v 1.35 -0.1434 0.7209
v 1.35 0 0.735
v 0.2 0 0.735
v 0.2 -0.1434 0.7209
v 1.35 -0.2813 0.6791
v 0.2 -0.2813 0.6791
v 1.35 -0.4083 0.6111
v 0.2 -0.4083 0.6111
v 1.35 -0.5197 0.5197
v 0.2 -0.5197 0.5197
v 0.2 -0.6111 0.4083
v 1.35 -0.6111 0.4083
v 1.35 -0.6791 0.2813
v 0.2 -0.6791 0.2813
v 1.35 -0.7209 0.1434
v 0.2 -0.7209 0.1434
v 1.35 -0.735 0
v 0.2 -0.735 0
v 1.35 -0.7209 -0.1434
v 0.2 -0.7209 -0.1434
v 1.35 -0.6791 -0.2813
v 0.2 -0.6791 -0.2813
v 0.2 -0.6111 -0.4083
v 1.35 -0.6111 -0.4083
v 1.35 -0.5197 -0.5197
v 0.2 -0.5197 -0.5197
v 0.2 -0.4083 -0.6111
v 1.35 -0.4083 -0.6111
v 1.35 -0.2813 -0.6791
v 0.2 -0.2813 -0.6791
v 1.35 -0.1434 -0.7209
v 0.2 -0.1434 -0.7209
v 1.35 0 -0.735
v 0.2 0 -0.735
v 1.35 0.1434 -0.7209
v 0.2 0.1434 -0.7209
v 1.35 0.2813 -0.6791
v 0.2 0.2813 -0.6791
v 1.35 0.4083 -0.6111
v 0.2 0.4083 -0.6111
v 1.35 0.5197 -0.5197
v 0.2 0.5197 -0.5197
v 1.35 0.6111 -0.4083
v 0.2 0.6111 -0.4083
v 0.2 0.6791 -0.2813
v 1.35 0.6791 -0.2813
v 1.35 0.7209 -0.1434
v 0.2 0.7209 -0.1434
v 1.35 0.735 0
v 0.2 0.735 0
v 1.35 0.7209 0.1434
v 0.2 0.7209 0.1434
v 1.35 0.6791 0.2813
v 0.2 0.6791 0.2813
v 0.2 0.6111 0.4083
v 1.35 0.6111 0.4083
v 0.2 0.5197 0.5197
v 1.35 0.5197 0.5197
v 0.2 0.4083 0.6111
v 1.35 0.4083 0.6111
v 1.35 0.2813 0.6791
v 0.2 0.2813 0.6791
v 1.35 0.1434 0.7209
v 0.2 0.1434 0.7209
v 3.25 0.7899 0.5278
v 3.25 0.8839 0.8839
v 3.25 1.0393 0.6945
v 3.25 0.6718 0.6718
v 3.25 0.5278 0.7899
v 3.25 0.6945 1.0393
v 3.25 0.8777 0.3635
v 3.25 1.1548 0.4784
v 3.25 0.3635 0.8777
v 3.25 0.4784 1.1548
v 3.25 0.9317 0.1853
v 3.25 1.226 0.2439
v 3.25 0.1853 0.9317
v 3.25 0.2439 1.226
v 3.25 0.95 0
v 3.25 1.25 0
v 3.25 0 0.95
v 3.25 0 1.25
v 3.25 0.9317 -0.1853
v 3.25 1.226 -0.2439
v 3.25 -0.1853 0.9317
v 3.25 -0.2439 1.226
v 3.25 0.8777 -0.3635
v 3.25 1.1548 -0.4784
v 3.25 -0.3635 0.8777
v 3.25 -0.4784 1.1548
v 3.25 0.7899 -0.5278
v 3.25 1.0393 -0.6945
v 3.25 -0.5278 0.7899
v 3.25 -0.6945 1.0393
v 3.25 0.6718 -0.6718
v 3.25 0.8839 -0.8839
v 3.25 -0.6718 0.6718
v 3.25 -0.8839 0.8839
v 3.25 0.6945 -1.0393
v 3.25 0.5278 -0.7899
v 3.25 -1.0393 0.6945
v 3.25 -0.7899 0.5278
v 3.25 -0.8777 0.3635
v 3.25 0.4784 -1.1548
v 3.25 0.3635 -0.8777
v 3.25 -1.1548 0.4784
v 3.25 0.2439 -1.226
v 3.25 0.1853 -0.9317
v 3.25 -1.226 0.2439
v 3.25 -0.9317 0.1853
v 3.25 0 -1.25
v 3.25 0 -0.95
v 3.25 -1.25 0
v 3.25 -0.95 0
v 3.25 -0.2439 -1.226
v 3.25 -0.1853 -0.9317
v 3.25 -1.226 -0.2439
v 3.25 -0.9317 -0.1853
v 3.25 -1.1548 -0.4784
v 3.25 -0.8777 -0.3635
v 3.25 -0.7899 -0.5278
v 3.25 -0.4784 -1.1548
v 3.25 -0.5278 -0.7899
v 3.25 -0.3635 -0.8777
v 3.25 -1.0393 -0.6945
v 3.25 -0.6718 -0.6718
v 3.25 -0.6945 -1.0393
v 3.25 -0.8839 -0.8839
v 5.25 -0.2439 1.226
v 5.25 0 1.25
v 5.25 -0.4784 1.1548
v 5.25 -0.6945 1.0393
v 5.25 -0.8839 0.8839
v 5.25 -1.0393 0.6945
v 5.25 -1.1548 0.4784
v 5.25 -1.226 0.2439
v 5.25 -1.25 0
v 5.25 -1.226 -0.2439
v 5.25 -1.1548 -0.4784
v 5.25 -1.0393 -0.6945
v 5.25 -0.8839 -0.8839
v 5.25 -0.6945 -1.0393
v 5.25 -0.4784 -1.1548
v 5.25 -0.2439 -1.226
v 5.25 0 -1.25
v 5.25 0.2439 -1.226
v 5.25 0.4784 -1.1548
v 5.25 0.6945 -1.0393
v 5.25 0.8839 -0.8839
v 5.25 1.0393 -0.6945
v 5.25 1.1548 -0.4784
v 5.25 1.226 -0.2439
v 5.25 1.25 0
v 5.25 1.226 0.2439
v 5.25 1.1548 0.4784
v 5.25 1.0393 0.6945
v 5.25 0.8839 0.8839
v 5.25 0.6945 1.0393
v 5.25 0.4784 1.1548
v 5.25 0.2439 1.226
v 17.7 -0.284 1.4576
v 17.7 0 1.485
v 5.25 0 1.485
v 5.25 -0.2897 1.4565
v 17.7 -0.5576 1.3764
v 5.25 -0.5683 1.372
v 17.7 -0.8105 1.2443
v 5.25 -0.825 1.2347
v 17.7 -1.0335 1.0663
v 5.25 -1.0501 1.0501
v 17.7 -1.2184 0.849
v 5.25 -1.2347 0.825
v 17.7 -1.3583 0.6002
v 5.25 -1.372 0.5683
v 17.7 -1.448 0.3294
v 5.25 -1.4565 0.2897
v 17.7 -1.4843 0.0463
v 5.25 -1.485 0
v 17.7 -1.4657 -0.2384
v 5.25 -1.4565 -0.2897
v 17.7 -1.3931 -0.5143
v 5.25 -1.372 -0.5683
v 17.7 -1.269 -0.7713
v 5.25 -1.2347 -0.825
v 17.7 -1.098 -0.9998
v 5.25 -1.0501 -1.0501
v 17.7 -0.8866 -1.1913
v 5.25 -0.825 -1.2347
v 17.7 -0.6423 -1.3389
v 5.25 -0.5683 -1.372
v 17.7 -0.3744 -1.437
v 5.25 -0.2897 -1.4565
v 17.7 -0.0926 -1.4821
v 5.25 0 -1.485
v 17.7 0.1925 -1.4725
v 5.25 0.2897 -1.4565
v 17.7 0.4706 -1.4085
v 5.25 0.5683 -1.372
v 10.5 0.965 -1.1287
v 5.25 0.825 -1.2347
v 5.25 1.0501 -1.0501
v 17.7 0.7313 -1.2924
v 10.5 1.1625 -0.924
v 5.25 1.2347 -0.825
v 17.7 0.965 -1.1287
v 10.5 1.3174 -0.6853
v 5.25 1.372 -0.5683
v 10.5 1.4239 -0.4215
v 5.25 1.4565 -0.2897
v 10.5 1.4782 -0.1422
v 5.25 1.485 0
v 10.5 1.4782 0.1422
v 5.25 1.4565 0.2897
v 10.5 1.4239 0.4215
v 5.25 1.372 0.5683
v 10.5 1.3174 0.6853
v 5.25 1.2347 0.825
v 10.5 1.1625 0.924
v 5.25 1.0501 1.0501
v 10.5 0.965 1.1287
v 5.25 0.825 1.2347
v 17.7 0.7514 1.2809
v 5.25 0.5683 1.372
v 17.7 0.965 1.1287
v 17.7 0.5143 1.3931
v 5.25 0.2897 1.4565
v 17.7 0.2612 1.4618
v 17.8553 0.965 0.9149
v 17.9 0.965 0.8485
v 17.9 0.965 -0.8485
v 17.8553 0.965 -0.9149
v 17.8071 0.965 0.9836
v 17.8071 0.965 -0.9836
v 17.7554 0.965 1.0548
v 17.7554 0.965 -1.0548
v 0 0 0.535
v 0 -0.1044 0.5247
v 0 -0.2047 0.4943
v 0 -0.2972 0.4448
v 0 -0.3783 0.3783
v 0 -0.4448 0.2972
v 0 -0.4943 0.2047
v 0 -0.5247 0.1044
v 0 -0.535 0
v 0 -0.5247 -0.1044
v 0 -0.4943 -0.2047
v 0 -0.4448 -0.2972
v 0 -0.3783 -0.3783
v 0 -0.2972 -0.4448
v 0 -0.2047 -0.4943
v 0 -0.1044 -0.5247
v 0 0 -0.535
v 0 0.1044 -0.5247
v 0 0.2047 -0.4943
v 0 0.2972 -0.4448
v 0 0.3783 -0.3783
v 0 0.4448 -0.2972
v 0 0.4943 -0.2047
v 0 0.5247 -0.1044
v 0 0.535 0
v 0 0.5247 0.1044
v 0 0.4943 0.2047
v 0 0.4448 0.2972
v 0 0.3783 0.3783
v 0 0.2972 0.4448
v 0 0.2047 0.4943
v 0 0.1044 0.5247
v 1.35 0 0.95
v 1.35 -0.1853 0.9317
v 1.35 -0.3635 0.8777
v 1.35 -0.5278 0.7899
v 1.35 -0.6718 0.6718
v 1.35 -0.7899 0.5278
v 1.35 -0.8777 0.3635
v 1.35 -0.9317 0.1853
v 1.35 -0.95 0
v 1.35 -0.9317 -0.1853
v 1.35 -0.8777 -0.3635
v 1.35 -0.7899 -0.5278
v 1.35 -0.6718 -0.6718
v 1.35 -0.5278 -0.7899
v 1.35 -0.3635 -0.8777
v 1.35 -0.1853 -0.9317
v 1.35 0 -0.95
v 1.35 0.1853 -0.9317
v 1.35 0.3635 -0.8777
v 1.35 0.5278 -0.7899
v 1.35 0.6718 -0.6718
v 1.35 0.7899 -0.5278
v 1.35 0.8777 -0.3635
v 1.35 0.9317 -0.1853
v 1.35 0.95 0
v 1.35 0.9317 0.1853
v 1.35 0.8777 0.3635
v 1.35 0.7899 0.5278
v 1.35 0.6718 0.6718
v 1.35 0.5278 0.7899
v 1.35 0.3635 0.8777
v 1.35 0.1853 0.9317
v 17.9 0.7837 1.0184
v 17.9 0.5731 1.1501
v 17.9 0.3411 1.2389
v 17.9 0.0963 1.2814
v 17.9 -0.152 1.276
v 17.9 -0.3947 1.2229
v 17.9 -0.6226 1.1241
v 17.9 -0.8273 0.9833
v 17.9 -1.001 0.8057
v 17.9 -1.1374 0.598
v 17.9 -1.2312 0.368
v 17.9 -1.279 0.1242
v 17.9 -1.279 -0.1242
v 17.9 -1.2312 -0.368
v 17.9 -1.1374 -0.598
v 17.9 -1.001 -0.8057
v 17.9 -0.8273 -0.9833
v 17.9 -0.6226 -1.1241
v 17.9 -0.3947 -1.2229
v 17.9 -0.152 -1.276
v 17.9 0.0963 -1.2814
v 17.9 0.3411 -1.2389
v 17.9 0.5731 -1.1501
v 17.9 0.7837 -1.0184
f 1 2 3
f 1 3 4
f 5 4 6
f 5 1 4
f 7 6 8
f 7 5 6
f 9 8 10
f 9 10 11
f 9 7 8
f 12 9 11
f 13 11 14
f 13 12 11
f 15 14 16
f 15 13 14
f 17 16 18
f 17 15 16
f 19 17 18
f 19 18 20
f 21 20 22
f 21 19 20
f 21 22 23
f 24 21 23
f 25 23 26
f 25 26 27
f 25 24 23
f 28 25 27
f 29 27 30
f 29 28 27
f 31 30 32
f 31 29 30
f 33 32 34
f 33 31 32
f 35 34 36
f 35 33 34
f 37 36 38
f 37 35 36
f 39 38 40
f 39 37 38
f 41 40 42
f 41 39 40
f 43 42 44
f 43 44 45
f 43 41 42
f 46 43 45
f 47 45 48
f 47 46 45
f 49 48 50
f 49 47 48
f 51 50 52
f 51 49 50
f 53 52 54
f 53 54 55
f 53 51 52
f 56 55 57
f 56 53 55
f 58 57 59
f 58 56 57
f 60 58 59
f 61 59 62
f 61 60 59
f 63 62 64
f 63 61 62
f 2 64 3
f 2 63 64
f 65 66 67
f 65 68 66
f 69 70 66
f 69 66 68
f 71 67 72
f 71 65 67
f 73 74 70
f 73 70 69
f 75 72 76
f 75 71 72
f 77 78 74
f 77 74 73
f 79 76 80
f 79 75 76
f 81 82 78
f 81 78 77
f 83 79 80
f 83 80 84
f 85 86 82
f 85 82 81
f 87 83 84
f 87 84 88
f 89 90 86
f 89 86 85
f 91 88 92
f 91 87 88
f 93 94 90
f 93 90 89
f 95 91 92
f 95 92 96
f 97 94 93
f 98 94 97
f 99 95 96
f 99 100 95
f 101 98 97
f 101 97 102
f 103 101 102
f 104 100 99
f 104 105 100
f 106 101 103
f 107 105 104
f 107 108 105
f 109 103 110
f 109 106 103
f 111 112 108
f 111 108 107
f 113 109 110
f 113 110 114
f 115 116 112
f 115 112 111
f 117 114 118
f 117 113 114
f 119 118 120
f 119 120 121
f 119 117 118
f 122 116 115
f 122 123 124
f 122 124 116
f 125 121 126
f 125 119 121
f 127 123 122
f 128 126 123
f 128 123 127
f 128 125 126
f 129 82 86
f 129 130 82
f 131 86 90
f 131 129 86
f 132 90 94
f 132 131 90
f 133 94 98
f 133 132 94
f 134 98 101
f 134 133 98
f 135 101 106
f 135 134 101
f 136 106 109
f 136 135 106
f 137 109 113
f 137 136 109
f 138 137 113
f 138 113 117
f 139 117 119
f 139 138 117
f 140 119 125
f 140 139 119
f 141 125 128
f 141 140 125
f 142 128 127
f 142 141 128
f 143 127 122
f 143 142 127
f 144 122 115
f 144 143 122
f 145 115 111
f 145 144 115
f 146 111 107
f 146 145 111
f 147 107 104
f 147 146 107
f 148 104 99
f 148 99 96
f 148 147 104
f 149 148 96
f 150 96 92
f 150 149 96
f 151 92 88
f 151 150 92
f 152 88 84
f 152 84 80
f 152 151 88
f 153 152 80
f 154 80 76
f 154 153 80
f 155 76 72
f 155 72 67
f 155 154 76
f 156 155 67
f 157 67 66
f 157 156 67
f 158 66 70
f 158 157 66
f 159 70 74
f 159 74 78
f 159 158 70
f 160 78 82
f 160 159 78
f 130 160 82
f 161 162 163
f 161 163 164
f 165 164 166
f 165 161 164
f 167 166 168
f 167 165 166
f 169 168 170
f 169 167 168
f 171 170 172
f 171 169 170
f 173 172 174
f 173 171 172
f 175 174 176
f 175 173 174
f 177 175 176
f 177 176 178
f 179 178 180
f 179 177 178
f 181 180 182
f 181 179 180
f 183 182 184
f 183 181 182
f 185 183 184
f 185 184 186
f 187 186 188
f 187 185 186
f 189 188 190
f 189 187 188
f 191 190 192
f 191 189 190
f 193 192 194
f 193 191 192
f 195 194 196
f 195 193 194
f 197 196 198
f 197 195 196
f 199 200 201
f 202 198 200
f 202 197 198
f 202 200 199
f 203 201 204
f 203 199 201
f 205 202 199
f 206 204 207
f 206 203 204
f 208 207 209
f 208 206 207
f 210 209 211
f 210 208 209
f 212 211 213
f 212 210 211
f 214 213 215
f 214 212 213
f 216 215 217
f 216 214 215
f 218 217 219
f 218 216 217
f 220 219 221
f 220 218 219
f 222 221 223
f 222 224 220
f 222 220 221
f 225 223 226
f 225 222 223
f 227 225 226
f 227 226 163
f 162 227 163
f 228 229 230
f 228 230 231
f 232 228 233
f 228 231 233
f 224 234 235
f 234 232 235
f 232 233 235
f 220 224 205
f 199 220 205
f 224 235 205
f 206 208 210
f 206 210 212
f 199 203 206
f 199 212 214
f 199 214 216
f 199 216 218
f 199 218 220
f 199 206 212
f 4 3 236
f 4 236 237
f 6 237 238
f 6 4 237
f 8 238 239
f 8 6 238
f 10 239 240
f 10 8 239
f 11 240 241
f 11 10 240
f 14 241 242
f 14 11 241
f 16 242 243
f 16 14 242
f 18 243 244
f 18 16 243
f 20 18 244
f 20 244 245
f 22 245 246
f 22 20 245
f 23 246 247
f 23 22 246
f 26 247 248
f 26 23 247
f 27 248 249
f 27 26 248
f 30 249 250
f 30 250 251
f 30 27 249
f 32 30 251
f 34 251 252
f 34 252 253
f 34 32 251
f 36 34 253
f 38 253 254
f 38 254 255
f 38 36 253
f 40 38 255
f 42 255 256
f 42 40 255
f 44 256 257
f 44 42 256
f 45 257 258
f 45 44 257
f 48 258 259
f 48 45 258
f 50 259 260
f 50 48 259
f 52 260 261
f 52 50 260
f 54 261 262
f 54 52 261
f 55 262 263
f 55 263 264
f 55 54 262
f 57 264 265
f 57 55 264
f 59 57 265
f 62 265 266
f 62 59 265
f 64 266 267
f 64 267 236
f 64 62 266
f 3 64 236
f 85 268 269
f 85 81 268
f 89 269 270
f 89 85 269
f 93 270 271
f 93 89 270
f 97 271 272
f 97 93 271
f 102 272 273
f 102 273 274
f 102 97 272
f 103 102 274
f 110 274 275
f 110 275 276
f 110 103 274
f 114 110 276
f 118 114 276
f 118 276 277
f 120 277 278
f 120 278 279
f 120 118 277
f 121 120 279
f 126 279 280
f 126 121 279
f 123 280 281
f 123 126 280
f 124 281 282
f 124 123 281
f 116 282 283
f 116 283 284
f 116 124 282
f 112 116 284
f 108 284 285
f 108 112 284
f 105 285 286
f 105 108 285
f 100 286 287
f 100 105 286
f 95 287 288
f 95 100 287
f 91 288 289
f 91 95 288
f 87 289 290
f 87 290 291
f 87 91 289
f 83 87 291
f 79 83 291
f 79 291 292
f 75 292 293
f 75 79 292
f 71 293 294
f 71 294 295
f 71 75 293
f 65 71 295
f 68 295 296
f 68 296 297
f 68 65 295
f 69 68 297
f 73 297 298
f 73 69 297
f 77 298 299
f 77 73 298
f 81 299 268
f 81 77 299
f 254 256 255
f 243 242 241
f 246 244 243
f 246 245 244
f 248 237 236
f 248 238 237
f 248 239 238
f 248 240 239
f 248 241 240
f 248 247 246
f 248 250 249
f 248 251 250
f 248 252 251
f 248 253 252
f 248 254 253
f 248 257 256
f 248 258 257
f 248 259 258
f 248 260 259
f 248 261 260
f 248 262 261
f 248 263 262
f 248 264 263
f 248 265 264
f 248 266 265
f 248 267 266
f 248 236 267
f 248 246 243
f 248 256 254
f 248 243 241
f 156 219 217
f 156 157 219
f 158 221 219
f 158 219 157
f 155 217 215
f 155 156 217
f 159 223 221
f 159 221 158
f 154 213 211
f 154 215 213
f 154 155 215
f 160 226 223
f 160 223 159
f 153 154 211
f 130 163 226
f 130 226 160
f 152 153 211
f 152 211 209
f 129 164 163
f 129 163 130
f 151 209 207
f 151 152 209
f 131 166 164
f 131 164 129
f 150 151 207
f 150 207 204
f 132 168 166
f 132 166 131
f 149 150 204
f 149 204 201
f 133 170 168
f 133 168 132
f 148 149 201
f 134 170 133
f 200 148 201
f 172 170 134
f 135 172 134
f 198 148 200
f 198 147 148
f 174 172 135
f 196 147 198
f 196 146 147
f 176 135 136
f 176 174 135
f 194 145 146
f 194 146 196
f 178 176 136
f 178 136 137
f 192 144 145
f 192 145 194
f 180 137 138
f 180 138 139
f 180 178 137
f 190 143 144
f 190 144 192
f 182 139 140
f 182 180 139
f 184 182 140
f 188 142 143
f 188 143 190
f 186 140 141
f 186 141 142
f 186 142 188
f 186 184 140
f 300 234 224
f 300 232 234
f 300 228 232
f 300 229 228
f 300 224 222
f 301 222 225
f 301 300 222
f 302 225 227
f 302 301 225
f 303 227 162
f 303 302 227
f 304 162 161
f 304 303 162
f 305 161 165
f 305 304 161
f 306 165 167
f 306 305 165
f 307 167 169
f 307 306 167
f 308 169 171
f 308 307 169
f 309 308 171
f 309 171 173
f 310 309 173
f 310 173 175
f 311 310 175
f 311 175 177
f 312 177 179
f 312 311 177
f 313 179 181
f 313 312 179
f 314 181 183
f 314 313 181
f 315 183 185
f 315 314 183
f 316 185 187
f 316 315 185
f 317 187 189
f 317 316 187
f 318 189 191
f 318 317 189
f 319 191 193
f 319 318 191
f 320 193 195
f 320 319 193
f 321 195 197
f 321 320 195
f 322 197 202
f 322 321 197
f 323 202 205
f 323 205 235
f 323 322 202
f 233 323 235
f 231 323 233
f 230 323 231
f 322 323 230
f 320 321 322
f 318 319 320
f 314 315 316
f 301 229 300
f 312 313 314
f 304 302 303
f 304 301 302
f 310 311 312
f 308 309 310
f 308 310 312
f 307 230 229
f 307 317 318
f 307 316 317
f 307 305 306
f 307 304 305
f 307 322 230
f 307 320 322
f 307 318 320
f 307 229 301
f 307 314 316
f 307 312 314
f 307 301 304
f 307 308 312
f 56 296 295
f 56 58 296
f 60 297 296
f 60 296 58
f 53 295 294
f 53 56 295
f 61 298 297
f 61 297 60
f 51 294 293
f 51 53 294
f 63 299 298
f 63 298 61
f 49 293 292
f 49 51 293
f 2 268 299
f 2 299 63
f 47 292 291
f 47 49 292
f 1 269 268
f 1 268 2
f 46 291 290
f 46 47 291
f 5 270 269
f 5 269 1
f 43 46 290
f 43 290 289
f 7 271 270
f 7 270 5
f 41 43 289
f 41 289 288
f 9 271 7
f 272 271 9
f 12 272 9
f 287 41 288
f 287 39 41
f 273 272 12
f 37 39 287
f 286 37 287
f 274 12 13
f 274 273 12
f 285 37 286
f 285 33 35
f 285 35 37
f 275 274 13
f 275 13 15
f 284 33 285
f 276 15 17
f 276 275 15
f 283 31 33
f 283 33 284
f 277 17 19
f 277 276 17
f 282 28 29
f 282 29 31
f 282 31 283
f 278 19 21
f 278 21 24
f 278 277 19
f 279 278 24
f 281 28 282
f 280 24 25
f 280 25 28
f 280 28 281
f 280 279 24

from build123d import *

# Parameters (mm, degrees)
CUT_EXTRUDE1_DEPTH = 7.4
CHAMFER1_SIZE      = 0.2


with BuildPart() as part:
    # Sketch1 → Revolve1 (revolve)
    with BuildSketch(Plane.XY, mode=Mode.PRIVATE) as revolve1_sk:
        Polygon((0, 0), (0, 0.735), (1.35, 0.735), (1.35, 0.95), (3.25, 0.95), (3.25, 1.25), (5.25, 1.25), (5.25, 1.485), (17.9, 1.485), (17.9, 0), align=None)
    revolve(revolve1_sk.sketch.rotate(Axis((-168.144085486, 0, 0), (1, 0, 0)), 90), axis=Axis((-168.144085486, 0, 0), (1, 0, 0)))

    # Sketch3 → Cut-Extrude1 (cut)
    with BuildSketch(Plane(origin=(17.9, 0, 0), x_dir=(0, 0, -1), z_dir=(1, 0, 0))):
        with BuildLine():
            Line((-1.128716085, 0.965), (1.128716085, 0.965))
            ThreePointArc((1.128716085, 0.965), (0, 1.485), (-1.128716085, 0.965))
        make_face()
    extrude(amount=-CUT_EXTRUDE1_DEPTH, mode=Mode.SUBTRACT)

    # Chamfer1
    chamfer1_edges = [part.edges().sort_by_distance(p)[0] for p in [
        (0, 0, -0.735),
        (17.9, -1.393084417, -0.514335306),
    ]]
    chamfer(chamfer1_edges, length=CHAMFER1_SIZE)


solid = part.part
